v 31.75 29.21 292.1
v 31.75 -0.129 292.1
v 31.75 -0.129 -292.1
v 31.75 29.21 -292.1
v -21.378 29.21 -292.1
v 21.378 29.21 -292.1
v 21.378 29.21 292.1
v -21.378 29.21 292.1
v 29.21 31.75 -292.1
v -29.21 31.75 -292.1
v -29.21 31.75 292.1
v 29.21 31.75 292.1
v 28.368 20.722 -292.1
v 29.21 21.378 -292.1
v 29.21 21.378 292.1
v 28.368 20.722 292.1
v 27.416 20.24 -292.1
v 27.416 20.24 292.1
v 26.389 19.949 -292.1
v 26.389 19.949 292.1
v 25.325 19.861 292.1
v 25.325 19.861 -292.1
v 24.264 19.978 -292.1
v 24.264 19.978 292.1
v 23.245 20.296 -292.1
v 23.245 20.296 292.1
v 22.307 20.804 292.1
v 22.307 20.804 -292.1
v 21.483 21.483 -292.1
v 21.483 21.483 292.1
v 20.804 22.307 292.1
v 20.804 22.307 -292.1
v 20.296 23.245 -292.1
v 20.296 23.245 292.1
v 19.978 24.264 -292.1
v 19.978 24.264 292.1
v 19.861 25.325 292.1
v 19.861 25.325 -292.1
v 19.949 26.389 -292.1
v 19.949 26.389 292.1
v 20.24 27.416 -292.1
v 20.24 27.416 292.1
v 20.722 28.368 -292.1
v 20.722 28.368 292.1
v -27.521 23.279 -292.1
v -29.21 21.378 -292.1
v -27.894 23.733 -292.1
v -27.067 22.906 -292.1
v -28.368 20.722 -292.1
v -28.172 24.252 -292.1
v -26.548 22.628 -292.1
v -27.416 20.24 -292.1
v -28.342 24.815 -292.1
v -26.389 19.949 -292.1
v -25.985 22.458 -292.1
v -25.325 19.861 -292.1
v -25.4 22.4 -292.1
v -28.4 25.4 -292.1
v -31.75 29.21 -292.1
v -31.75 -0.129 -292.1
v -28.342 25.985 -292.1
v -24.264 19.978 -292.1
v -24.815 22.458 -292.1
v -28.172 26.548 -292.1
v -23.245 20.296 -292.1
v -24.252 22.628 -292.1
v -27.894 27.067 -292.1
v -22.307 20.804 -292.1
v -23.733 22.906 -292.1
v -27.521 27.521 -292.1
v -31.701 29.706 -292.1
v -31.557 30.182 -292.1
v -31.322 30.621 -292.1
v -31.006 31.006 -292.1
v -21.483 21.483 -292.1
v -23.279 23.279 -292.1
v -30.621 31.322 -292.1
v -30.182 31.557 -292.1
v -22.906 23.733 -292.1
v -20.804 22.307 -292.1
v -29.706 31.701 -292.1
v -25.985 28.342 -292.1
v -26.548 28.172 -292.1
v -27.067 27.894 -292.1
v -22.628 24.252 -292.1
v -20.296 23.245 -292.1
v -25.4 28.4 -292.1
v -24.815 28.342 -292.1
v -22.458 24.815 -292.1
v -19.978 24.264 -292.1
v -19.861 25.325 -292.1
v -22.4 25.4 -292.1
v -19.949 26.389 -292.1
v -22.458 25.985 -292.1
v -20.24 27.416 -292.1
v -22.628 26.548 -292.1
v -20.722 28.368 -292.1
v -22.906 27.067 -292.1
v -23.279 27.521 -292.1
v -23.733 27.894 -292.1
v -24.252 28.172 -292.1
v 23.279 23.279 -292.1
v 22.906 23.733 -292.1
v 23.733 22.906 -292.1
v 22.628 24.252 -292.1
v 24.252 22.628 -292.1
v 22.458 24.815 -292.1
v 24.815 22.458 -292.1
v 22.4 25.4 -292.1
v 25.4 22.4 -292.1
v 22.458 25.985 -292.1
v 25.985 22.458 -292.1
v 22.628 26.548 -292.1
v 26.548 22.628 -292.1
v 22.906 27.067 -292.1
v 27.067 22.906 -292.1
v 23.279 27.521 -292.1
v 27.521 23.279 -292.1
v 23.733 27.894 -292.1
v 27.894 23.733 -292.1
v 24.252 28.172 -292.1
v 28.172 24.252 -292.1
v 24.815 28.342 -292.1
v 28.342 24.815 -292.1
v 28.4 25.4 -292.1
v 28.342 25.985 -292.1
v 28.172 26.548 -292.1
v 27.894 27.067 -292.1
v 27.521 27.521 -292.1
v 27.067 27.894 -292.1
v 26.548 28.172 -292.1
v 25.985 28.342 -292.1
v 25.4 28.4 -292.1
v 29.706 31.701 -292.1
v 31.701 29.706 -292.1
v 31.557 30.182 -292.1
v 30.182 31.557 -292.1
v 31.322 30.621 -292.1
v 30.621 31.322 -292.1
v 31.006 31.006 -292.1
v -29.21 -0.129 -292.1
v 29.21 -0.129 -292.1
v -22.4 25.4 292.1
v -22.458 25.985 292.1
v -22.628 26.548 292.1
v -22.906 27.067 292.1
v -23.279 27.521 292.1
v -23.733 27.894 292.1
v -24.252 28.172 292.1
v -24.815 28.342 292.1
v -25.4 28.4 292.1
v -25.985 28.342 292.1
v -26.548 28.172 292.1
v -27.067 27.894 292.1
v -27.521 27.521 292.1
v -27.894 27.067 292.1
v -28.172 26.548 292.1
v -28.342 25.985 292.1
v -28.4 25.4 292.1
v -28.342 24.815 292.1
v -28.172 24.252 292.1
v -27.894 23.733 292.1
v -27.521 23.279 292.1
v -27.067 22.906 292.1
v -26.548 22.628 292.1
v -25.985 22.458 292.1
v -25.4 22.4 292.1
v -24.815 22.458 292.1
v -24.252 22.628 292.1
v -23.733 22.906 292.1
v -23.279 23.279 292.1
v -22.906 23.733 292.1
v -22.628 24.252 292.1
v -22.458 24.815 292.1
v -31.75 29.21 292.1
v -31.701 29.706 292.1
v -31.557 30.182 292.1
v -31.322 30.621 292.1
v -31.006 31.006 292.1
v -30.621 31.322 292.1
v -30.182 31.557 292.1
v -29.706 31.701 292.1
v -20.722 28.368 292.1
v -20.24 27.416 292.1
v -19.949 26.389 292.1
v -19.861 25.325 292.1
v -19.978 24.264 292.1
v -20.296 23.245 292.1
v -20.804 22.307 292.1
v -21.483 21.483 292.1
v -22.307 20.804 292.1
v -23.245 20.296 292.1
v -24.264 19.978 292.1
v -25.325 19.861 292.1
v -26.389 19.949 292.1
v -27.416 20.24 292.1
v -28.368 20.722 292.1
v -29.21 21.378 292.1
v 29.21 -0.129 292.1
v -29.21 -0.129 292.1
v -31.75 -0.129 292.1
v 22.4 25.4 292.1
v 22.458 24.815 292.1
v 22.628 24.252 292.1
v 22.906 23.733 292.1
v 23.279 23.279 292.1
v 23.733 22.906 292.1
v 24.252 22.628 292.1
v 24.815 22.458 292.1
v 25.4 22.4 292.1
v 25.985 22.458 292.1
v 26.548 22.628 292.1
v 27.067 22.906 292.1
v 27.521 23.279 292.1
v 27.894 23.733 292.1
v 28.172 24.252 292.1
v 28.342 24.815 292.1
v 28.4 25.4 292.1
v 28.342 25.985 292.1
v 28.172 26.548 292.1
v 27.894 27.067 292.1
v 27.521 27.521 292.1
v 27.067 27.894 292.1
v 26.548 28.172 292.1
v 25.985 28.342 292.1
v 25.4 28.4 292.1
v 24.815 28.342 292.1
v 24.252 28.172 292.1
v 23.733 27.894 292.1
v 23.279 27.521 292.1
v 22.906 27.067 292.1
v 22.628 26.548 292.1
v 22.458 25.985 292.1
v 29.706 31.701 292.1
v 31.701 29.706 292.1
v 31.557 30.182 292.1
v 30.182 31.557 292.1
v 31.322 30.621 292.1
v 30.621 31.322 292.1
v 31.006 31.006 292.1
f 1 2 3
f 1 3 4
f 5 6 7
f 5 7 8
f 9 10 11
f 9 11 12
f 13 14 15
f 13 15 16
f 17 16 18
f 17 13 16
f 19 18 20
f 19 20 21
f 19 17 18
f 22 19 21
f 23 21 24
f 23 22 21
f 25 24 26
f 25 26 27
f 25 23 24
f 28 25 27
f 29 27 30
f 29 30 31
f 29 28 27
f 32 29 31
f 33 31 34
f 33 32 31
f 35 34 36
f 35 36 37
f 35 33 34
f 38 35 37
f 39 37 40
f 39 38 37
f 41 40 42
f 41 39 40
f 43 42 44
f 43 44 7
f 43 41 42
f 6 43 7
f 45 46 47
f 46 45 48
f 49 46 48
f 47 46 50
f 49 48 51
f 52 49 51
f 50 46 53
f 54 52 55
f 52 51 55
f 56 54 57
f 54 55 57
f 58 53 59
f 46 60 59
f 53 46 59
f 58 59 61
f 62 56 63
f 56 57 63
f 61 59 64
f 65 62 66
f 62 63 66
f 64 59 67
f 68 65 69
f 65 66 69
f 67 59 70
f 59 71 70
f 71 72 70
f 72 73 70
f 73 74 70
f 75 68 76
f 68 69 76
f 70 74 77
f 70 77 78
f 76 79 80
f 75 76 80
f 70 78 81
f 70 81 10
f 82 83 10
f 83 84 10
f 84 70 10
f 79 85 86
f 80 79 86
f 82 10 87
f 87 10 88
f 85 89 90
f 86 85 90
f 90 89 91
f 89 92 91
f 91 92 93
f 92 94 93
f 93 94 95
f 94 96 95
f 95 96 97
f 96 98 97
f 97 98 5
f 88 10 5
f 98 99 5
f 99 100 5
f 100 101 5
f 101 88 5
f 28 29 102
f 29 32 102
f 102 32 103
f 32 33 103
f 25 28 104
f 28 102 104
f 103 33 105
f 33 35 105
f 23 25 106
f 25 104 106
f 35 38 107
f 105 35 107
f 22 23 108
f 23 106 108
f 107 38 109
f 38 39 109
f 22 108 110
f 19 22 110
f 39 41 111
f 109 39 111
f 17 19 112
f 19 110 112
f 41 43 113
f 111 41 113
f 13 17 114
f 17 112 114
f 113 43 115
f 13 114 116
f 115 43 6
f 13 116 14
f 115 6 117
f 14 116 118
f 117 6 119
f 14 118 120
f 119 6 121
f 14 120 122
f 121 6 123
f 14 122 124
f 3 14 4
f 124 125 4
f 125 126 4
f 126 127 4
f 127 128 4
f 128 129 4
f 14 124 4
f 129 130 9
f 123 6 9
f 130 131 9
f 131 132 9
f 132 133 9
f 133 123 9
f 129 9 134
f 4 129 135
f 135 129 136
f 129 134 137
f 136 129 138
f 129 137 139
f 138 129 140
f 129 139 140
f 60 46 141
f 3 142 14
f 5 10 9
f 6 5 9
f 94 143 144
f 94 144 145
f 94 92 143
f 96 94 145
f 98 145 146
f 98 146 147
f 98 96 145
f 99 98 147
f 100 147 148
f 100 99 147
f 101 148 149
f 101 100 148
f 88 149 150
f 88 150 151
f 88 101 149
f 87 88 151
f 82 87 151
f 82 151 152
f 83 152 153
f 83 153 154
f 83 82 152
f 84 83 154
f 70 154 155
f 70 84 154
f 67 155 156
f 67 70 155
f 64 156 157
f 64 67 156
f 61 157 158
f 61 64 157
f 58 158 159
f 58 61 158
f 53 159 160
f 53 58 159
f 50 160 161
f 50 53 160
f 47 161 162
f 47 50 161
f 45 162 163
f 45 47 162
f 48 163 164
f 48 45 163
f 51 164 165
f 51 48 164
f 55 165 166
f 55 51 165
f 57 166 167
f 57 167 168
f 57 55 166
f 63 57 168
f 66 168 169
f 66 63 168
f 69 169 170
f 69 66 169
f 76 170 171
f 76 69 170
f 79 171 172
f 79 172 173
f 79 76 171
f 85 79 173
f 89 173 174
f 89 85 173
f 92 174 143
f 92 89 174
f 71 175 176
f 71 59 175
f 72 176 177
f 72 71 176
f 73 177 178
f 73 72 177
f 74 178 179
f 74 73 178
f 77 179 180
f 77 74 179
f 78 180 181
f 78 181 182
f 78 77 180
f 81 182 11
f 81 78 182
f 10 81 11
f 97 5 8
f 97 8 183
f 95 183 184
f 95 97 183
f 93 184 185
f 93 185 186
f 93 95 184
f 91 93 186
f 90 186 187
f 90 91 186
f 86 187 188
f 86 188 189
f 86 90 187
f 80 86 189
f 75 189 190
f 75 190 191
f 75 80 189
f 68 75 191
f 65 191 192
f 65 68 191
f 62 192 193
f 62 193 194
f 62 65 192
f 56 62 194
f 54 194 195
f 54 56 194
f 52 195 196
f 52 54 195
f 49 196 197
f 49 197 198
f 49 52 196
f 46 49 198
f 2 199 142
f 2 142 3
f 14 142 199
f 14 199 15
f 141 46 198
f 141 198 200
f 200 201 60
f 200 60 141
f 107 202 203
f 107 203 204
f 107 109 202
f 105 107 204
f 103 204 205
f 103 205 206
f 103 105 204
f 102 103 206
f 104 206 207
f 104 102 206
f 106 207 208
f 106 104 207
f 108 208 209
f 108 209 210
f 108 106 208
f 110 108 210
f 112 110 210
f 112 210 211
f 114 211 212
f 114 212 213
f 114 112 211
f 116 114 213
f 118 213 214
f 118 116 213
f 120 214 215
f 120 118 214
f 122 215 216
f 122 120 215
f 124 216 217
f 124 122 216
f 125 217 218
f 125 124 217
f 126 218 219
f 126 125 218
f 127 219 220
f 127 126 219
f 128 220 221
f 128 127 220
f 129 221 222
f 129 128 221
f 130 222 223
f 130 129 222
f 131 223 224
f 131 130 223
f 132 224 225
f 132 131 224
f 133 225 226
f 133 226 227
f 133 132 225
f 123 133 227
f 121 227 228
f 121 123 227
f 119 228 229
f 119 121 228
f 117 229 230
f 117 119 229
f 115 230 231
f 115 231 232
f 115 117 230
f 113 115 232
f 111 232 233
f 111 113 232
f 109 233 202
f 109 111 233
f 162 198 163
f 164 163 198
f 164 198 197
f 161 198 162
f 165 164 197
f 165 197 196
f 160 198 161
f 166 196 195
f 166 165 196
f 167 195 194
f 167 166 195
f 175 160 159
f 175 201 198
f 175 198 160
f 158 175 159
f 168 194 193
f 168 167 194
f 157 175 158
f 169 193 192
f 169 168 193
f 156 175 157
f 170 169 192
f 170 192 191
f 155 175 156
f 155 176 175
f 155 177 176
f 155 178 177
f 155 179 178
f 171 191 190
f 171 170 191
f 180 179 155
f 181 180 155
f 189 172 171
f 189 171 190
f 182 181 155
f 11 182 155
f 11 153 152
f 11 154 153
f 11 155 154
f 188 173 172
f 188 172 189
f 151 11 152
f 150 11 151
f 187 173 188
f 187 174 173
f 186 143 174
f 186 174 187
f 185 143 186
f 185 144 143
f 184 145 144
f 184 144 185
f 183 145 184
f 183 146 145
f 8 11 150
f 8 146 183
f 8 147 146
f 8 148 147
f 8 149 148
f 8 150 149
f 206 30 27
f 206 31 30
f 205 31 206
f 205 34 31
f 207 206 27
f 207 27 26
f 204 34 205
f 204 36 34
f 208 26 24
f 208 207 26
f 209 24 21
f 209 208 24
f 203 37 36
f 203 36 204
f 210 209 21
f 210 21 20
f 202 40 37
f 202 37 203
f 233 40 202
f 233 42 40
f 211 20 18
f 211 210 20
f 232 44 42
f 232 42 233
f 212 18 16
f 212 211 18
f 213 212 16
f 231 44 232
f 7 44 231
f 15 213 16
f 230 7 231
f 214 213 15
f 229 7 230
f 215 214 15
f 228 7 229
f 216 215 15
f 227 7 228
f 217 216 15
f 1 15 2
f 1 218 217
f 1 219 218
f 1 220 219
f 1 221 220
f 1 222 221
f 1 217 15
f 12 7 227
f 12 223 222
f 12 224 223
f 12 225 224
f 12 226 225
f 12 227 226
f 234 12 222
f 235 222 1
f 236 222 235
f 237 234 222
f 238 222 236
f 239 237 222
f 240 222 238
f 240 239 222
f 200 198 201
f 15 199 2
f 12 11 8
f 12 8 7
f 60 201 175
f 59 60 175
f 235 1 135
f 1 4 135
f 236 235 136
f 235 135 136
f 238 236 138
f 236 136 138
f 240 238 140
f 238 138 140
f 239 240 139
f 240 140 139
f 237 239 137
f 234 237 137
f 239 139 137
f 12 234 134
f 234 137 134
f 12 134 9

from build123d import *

# Parameters (mm, degrees)
SKETCH1_W           = 63.5
SKETCH1_H           = 63.5
SKETCH1_R           = 3
BOSS_EXTRUDE1_DEPTH = 292.1
FILLET1_R           = 2.54
SHELL1_START        = -292.1
SHELL1_DEPTH        = 584.2
SKETCH3_W           = 63.665273771
SKETCH3_H           = 31.75
CUT_EXTRUDE2_DEPTH  = 586.923002621


# Read off the part's stored shape, not the designer's step: Shell1
with BuildPart() as part:
    # Sketch1 → Boss-Extrude1 (new, symmetric)
    with BuildSketch(Plane.XY):
        Rectangle(SKETCH1_W, SKETCH1_H)
        with Locations((-25.4, 25.4)):
            Circle(SKETCH1_R, mode=Mode.SUBTRACT)
        with Locations(Location((25.4, -25.4, 0), (0, 0, 180))):
            Circle(SKETCH1_R, mode=Mode.SUBTRACT)
        with Locations(Location((-25.4, -25.4, 0), (0, 0, 180))):
            Circle(SKETCH1_R, mode=Mode.SUBTRACT)
        with Locations(Location((25.4, 25.4, 0), (0, 0, 180))):
            Circle(SKETCH1_R, mode=Mode.SUBTRACT)
    extrude(amount=BOSS_EXTRUDE1_DEPTH, both=True)

    # Fillet1
    fillet1_edges = [part.edges().sort_by_distance(p)[0] for p in [
        (31.75, -31.75, 0),
        (-31.75, -31.75, 0),
        (-31.75, 31.75, 0),
        (31.75, 31.75, 0),
    ]]
    fillet(fillet1_edges, radius=FILLET1_R)

    # Shell1 outline → Shell1 (cut)
    with BuildSketch(Plane.XY.offset(SHELL1_START)):
        with BuildLine():
            Line((29.21, -21.378122329), (29.21, 21.378122329))
            ThreePointArc((29.21, 21.378122329), (21.482628432, 21.482628432), (21.378122329, 29.21))
            Line((21.378122329, 29.21), (-21.378122329, 29.21))
            ThreePointArc((-21.378122329, 29.21), (-21.482628432, 21.482628432), (-29.21, 21.378122329))
            Line((-29.21, 21.378122329), (-29.21, -21.378122329))
            ThreePointArc((-29.21, -21.378122329), (-21.482628432, -21.482628432), (-21.378122329, -29.21))
            Line((-21.378122329, -29.21), (21.378122329, -29.21))
            ThreePointArc((21.378122329, -29.21), (21.482628432, -21.482628432), (29.21, -21.378122329))
        make_face()
    extrude(amount=SHELL1_DEPTH, mode=Mode.SUBTRACT)

    # Sketch3 → Cut-Extrude2 (cut, through all)
    with BuildSketch(Plane.XY.offset(292.1)):
        with Locations((0.082636885, -16.003852467)):
            Rectangle(SKETCH3_W, SKETCH3_H)
    extrude(amount=-CUT_EXTRUDE2_DEPTH, mode=Mode.SUBTRACT)


solid = part.part
